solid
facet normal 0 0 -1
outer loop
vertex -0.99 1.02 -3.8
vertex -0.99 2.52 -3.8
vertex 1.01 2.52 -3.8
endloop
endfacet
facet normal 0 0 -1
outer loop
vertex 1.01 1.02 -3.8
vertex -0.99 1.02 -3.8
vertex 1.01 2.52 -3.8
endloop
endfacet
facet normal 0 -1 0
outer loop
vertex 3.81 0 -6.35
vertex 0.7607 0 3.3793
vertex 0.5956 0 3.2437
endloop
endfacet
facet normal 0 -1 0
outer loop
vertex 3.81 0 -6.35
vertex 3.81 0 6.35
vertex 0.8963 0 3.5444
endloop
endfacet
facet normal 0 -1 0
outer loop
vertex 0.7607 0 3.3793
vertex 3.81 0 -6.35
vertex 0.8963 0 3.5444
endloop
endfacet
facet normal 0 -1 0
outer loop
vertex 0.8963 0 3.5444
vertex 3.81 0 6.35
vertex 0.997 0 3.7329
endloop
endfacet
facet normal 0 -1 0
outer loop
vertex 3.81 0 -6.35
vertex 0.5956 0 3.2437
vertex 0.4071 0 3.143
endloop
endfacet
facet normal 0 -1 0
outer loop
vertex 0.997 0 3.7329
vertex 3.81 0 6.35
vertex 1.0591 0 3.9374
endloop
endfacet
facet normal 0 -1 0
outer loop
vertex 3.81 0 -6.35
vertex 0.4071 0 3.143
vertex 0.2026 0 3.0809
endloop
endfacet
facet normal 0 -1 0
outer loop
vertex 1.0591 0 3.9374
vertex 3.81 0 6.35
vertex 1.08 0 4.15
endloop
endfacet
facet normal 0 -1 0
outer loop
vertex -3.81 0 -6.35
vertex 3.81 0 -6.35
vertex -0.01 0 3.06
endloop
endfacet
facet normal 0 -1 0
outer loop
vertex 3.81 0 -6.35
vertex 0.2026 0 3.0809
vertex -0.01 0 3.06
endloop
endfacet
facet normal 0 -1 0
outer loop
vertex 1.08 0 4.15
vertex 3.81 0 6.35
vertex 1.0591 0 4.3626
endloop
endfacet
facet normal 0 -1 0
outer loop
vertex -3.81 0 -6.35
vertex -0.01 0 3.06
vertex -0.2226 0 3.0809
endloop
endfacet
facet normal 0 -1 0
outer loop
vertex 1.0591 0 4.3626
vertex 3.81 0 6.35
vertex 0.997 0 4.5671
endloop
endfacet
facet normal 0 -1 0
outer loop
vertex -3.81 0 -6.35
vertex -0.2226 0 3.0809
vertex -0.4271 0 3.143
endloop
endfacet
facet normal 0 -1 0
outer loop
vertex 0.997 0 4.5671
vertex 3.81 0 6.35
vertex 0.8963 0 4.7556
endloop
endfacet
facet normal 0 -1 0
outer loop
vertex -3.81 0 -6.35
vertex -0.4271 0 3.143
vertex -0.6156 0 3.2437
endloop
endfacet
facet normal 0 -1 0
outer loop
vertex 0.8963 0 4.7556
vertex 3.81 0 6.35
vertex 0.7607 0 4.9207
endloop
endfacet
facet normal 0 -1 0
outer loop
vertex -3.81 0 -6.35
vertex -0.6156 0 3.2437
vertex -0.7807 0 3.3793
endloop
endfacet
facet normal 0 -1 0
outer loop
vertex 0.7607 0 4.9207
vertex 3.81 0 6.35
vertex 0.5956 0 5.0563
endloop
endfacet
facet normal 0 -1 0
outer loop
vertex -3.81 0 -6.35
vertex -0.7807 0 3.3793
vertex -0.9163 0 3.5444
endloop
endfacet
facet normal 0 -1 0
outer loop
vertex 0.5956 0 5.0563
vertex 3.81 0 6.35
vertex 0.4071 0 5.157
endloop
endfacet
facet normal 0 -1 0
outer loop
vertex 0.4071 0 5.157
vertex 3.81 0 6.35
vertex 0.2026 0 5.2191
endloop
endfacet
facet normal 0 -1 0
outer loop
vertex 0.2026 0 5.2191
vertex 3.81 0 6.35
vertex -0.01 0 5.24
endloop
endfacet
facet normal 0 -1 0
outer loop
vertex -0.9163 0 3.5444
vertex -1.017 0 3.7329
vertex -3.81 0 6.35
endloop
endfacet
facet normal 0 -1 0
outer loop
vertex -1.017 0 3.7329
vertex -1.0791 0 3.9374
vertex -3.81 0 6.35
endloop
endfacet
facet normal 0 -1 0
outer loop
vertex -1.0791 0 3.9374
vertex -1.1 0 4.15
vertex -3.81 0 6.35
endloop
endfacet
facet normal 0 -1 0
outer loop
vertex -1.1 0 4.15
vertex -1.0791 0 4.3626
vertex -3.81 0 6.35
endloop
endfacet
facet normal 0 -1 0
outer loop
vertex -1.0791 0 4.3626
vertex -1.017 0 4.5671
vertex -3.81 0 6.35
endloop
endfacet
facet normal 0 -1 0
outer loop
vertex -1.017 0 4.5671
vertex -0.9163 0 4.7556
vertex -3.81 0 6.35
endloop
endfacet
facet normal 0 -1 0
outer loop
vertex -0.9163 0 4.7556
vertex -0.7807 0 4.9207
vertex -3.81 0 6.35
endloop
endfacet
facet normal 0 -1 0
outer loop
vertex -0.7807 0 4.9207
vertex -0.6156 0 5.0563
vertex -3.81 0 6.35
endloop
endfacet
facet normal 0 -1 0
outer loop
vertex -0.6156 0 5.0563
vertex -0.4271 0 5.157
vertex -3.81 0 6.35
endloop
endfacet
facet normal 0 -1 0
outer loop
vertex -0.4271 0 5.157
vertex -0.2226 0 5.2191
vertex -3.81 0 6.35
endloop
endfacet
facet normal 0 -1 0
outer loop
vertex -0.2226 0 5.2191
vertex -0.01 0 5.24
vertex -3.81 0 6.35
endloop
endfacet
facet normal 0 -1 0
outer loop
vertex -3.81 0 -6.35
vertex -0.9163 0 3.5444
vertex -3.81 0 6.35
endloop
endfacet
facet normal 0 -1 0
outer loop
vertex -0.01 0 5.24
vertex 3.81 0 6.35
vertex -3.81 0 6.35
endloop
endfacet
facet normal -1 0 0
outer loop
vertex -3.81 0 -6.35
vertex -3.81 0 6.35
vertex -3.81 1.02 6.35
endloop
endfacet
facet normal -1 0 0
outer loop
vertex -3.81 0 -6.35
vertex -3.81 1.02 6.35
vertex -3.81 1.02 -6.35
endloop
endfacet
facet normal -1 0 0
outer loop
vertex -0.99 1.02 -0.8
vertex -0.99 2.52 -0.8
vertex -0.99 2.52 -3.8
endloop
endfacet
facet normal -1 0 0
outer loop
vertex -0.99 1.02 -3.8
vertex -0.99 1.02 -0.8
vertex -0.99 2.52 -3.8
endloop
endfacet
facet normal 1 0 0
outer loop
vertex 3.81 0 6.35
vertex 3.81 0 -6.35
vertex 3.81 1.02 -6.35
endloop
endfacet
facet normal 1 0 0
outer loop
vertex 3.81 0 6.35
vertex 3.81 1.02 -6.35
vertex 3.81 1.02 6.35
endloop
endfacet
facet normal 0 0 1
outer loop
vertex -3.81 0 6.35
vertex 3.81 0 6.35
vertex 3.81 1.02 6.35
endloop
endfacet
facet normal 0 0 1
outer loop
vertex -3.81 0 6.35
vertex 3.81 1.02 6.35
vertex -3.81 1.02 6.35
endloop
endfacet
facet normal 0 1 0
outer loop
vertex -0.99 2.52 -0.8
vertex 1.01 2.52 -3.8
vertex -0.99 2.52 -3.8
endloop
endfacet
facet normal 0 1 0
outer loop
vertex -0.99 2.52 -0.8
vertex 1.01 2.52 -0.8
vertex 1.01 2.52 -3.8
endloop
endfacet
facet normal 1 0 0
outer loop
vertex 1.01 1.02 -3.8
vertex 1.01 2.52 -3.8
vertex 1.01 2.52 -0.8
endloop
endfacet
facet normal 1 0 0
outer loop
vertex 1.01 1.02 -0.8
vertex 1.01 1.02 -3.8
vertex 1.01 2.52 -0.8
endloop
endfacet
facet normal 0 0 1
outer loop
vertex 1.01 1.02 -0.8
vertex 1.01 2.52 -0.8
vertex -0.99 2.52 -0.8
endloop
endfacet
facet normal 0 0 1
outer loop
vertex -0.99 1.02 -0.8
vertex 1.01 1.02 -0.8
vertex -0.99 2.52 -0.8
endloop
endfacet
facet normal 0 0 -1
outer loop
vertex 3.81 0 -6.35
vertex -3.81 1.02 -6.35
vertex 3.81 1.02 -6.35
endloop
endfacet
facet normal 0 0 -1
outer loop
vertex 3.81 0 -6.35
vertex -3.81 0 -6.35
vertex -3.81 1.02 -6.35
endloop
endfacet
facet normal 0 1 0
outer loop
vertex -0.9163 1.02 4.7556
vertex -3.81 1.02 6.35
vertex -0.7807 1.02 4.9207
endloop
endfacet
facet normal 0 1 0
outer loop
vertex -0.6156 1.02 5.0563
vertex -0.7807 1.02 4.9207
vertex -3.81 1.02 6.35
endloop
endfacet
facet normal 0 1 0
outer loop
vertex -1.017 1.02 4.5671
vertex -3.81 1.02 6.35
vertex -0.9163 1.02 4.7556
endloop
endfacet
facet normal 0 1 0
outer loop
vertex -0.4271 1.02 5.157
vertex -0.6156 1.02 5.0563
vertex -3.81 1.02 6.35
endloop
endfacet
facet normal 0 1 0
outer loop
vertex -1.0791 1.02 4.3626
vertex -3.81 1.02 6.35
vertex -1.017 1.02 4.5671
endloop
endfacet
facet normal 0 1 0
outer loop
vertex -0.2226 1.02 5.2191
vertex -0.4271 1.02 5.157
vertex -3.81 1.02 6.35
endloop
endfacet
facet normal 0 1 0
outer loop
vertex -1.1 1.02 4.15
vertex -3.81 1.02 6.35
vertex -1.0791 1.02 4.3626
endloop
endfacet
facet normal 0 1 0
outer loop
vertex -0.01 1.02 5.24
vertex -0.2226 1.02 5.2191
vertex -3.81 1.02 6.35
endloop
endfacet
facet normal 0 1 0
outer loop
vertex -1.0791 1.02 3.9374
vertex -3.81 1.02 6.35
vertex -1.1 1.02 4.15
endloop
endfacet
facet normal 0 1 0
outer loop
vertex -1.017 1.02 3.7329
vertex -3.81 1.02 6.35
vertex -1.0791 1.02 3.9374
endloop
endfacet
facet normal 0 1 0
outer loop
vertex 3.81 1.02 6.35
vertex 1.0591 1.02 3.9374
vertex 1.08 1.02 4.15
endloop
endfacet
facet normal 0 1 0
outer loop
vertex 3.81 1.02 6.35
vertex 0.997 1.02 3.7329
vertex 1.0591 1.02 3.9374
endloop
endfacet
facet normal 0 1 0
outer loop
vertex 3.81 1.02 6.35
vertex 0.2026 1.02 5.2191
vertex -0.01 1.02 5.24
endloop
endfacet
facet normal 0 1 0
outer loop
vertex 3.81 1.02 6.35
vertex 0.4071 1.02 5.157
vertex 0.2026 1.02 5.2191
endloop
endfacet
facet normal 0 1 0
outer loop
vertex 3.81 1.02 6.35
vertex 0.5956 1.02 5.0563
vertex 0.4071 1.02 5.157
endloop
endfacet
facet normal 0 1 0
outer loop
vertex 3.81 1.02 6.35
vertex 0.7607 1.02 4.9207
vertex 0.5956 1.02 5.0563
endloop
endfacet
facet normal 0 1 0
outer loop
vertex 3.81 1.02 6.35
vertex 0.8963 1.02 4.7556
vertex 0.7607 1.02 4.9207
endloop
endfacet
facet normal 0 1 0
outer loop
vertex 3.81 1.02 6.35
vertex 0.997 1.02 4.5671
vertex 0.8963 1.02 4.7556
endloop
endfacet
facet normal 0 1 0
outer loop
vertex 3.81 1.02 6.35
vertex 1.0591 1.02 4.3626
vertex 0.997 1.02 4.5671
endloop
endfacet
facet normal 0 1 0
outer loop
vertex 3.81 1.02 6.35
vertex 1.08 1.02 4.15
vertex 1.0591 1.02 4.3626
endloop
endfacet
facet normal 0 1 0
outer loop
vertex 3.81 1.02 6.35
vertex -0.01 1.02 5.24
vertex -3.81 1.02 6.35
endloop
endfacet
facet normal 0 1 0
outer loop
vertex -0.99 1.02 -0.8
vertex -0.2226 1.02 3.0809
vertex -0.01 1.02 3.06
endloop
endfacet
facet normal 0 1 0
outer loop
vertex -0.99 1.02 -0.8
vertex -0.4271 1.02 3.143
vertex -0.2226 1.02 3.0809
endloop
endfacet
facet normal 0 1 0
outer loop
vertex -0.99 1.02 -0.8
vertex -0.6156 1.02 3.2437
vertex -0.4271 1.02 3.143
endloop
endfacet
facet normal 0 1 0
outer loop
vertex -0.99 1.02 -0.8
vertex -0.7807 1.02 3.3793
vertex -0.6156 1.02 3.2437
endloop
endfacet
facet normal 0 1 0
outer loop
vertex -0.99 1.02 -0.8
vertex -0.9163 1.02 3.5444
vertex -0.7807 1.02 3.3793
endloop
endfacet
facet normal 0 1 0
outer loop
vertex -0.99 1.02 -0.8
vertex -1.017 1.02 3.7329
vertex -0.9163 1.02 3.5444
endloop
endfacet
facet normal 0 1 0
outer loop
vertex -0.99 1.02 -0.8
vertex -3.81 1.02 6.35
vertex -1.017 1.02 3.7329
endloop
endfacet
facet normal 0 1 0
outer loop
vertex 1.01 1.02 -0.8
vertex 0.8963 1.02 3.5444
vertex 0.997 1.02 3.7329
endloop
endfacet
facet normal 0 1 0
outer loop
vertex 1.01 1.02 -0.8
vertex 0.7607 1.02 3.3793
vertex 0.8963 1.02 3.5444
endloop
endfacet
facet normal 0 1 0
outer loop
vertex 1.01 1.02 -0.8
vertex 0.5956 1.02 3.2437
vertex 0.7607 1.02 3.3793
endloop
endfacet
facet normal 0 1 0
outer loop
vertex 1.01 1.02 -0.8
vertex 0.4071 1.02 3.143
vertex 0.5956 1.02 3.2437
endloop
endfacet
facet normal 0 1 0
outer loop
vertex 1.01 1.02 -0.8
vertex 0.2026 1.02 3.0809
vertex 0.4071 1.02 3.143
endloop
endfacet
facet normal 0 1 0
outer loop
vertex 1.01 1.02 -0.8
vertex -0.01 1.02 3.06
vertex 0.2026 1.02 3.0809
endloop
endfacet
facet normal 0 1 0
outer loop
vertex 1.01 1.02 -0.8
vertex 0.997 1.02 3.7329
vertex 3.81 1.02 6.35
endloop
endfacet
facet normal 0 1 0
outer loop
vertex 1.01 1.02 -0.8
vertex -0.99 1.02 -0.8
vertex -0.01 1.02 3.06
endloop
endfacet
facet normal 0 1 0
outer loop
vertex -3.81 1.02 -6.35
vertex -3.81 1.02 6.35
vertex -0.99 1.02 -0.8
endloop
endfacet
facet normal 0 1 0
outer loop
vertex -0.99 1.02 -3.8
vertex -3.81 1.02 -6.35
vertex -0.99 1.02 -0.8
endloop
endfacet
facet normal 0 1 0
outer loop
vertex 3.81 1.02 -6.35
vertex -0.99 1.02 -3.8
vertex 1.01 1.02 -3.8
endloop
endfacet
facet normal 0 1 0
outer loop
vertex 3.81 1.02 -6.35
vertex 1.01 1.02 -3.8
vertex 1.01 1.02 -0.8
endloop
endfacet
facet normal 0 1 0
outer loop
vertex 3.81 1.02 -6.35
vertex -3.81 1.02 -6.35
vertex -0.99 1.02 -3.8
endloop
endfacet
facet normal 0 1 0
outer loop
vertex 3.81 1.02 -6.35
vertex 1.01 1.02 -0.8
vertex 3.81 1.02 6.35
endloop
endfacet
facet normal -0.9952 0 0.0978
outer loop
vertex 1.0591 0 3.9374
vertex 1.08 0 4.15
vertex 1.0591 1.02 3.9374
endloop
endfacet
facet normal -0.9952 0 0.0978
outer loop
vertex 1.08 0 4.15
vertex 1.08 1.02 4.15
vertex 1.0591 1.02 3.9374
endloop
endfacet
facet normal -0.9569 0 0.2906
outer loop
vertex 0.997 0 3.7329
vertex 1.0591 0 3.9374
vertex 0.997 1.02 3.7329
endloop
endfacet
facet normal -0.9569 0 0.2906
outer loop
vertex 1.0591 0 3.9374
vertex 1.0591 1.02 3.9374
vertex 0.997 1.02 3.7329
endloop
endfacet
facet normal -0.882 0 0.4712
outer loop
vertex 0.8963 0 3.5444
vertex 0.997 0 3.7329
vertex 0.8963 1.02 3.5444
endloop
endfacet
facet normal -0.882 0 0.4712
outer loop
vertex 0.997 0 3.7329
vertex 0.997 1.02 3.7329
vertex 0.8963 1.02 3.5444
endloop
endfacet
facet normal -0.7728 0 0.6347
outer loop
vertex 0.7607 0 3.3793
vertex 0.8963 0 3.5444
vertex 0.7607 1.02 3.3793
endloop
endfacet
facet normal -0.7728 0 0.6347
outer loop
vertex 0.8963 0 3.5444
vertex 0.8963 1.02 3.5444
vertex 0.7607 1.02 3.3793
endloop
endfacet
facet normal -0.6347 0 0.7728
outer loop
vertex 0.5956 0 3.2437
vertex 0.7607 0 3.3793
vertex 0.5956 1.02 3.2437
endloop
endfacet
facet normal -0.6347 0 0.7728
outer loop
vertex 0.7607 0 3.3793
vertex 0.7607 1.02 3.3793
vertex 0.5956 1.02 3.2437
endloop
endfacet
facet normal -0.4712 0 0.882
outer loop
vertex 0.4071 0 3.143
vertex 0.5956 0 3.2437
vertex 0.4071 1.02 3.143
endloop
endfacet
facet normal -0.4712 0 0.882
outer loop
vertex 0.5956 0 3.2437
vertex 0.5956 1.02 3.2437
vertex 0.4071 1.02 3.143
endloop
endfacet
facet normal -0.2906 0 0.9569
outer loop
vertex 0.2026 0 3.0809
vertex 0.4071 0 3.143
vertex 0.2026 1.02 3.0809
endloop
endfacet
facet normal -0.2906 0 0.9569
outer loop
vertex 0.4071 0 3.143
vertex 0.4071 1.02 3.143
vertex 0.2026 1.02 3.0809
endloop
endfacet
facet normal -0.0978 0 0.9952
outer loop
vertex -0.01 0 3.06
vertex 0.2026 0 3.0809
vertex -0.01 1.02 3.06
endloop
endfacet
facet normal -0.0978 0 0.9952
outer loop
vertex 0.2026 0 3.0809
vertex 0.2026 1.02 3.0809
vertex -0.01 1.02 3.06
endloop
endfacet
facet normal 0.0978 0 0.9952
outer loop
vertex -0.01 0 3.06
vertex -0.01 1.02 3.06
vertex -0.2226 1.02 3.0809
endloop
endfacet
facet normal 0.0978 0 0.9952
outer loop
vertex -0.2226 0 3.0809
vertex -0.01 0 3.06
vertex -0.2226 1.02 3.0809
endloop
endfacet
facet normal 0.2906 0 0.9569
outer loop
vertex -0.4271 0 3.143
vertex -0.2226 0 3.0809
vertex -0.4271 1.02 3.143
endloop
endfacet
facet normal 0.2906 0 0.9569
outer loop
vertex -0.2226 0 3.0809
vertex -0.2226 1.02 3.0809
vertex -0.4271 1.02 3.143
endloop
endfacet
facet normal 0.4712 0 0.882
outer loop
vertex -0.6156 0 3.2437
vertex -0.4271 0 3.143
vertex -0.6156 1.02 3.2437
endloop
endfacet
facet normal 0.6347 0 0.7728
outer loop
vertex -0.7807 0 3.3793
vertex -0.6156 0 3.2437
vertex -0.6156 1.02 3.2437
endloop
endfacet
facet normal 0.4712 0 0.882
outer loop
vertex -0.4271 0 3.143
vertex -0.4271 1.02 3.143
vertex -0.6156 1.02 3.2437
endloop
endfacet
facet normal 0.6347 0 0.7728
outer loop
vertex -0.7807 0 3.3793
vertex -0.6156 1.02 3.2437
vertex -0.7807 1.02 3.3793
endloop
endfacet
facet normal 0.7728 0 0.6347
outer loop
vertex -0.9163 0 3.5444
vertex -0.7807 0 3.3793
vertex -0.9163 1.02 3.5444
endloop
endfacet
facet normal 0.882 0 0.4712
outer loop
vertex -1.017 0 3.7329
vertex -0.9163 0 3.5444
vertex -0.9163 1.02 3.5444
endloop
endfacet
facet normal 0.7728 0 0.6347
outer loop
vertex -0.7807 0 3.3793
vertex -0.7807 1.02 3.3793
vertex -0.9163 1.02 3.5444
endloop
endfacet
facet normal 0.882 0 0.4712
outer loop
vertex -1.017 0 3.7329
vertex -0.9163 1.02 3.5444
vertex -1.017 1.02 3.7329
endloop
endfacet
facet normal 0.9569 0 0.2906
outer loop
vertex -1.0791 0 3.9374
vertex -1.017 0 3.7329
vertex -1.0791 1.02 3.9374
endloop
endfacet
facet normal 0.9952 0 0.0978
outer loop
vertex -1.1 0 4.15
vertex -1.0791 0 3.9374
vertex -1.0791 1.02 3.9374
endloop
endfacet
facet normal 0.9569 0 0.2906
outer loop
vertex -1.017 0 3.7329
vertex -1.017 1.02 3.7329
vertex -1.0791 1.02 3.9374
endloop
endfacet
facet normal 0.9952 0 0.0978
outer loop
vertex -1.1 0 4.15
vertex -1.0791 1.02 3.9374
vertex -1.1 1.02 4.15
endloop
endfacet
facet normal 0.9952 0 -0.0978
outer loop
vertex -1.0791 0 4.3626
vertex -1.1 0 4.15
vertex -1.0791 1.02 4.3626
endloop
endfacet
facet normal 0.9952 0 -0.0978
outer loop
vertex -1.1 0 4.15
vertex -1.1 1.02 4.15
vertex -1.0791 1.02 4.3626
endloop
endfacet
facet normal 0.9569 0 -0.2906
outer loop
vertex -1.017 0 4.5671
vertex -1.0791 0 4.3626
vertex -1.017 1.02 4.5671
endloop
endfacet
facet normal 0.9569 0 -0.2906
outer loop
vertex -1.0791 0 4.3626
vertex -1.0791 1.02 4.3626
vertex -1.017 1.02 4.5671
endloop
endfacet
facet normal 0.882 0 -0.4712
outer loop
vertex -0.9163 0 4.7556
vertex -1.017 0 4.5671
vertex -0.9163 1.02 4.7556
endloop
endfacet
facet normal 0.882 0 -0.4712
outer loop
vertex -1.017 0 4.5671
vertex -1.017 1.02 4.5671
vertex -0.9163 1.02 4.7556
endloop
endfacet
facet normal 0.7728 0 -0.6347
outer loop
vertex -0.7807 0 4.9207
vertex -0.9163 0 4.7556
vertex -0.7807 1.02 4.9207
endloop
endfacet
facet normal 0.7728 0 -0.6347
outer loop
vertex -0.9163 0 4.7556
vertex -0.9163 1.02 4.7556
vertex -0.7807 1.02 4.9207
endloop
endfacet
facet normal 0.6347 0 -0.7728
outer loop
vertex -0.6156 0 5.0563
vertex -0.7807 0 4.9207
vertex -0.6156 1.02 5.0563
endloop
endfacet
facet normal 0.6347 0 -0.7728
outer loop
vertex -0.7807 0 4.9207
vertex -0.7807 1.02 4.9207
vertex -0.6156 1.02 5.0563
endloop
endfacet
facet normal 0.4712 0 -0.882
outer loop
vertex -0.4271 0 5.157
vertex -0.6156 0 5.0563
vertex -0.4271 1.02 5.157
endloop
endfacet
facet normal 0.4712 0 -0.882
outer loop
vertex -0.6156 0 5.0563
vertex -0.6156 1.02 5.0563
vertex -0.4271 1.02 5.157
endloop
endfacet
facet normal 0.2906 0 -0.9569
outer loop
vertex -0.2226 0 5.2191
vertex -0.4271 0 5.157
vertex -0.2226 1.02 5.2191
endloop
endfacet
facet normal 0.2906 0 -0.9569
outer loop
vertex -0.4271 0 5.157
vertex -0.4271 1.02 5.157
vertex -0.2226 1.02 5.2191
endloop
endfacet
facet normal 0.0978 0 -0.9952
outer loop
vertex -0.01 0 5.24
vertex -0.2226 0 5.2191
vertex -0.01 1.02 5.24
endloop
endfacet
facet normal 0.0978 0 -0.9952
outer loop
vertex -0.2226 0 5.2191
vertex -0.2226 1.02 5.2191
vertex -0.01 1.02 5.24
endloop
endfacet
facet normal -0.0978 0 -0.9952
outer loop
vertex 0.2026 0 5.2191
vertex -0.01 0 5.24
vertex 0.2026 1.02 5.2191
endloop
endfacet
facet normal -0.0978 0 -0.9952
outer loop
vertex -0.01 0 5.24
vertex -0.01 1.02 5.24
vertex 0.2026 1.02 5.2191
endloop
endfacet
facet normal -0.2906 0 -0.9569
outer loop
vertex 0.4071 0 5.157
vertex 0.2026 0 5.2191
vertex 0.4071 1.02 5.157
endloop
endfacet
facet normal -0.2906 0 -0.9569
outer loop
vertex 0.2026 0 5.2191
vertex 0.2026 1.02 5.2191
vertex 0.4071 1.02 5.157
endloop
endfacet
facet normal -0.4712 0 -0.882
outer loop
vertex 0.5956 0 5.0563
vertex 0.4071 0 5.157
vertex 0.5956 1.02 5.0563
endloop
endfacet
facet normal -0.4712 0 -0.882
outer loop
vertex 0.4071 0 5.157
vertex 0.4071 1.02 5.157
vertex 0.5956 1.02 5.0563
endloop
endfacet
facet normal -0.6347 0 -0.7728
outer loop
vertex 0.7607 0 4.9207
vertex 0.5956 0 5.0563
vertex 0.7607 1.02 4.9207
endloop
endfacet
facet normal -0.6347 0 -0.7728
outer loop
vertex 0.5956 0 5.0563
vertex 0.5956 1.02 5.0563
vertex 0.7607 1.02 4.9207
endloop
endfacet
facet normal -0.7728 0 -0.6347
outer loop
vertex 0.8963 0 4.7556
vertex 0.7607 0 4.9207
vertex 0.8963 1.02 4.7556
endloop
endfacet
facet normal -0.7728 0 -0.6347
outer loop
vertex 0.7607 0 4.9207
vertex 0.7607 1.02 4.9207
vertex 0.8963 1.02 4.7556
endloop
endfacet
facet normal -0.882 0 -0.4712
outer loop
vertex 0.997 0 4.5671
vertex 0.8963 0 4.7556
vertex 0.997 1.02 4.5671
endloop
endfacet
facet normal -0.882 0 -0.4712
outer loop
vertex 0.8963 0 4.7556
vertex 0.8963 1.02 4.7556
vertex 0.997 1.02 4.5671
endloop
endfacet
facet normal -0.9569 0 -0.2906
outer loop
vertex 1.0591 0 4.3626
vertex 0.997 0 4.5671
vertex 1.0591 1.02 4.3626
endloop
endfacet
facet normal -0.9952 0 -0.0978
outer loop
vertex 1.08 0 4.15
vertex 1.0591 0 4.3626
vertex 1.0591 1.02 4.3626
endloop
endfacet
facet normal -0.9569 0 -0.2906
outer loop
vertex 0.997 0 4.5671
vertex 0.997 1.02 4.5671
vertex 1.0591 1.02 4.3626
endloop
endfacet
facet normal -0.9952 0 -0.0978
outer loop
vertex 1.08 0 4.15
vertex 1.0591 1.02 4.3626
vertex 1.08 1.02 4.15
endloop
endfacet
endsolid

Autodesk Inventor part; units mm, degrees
ref_plane "YZ Plane" through (0, 0, 0) normal (1, 0, 0) x (0, 1, 0)
ref_plane "XZ Plane" through (0, 0, 0) normal (0, 1, 0) x (-1, 0, 0)
ref_plane "XY Plane" through (0, 0, 0) normal (0, 0, 1) x (1, 0, 0)
sketch "Sketch1" plane through (0, 0, 0) normal (0, 1, 0) x (-1, 0, 0)
  line L0 (-3.81, 6.35) -> (3.81, 6.35)
  line L1 (3.81, 6.35) -> (3.81, -6.35)
  line L2 (3.81, -6.35) -> (-3.81, -6.35)
  line L3 (-3.81, -6.35) -> (-3.81, 6.35)
  line L4 (-3.81, 6.35) -> (3.81, -6.35) construction
  line L5 (3.81, 6.35) -> (-3.81, -6.35) construction
  point P0 (0, 0)
  dimension "d0" = 12.7
  dimension "d1" = 7.62
extrude "Extrusion1" add sketch "Sketch1" along normal blind 2.52
sketch "Sketch2" plane through (0, 2.52, 0) normal (0, 1, 0) x (1, 0, 0)
  circle A0 centre (-0.01, -4.15) radius 1.09
  line L0 (-3.81, -6.35) -> (3.81, -6.35) projected
  line L1 (0.99, 3.35) -> (-1.01, 3.35)
  line L2 (-1.01, 3.35) -> (-1.01, 0.35)
  line L3 (-1.01, 0.35) -> (0.99, 0.35)
  line L4 (0.99, 0.35) -> (0.99, 3.35)
  line L5 (0.99, 3.35) -> (-1.01, 0.35) construction
  line L6 (-1.01, 3.35) -> (0.99, 0.35) construction
  line L7 (-3.81, 6.35) -> (-3.81, -6.35) projected
  line L8 (3.81, 6.35) -> (-3.81, 6.35) projected
  point P0 (0, 0)
  point P1 (0, -6.35)
  point P2 (-0.01, 1.85)
  dimension "d4" = 2.18
  dimension "d5" = 2.2
  dimension "d6" = 3
  dimension "d7" = 2
  dimension "d16" = 3.8
  dimension "d17" = 4.5
  dimension "d18" = 3.8
extrude "Extrusion2" cut sketch "Sketch2" against normal through all contours A0
sketch "Sketch3" plane through (0, 2.52, 0) normal (0, 1, 0) x (1, 0, 0)
  line L0 (1.01, 0.8) -> (-0.99, 0.8)
  line L1 (-0.99, 0.8) -> (-0.99, 3.8)
  line L2 (-0.99, 3.8) -> (1.01, 3.8)
  line L3 (1.01, 3.8) -> (1.01, 0.8)
  line L4 (1.01, 0.8) -> (-0.99, 3.8) construction
  line L5 (-0.99, 0.8) -> (1.01, 3.8) construction
  line L6 (3.81, -6.35) -> (3.81, 6.35) projected
  line L7 (-3.81, -6.35) -> (3.81, -6.35) projected
  line L8 (3.81, 6.35) -> (-3.81, 6.35) projected
  line L9 (-3.81, -6.35) -> (3.81, -6.35)
  line L10 (3.81, -6.35) -> (3.81, 6.35)
  line L11 (3.81, 6.35) -> (-3.81, 6.35)
  line L12 (-3.81, 6.35) -> (-3.81, -6.35)
  point P0 (0, 0)
  point P1 (0.01, 2.3)
  dimension "d10" = 3
  dimension "d11" = 2
  dimension "d12" = 2.3
  dimension "d13" = 3.8
extrude "Extrusion3" cut sketch "Sketch3" against normal blind 1.5
properties part number "lightSensor"
